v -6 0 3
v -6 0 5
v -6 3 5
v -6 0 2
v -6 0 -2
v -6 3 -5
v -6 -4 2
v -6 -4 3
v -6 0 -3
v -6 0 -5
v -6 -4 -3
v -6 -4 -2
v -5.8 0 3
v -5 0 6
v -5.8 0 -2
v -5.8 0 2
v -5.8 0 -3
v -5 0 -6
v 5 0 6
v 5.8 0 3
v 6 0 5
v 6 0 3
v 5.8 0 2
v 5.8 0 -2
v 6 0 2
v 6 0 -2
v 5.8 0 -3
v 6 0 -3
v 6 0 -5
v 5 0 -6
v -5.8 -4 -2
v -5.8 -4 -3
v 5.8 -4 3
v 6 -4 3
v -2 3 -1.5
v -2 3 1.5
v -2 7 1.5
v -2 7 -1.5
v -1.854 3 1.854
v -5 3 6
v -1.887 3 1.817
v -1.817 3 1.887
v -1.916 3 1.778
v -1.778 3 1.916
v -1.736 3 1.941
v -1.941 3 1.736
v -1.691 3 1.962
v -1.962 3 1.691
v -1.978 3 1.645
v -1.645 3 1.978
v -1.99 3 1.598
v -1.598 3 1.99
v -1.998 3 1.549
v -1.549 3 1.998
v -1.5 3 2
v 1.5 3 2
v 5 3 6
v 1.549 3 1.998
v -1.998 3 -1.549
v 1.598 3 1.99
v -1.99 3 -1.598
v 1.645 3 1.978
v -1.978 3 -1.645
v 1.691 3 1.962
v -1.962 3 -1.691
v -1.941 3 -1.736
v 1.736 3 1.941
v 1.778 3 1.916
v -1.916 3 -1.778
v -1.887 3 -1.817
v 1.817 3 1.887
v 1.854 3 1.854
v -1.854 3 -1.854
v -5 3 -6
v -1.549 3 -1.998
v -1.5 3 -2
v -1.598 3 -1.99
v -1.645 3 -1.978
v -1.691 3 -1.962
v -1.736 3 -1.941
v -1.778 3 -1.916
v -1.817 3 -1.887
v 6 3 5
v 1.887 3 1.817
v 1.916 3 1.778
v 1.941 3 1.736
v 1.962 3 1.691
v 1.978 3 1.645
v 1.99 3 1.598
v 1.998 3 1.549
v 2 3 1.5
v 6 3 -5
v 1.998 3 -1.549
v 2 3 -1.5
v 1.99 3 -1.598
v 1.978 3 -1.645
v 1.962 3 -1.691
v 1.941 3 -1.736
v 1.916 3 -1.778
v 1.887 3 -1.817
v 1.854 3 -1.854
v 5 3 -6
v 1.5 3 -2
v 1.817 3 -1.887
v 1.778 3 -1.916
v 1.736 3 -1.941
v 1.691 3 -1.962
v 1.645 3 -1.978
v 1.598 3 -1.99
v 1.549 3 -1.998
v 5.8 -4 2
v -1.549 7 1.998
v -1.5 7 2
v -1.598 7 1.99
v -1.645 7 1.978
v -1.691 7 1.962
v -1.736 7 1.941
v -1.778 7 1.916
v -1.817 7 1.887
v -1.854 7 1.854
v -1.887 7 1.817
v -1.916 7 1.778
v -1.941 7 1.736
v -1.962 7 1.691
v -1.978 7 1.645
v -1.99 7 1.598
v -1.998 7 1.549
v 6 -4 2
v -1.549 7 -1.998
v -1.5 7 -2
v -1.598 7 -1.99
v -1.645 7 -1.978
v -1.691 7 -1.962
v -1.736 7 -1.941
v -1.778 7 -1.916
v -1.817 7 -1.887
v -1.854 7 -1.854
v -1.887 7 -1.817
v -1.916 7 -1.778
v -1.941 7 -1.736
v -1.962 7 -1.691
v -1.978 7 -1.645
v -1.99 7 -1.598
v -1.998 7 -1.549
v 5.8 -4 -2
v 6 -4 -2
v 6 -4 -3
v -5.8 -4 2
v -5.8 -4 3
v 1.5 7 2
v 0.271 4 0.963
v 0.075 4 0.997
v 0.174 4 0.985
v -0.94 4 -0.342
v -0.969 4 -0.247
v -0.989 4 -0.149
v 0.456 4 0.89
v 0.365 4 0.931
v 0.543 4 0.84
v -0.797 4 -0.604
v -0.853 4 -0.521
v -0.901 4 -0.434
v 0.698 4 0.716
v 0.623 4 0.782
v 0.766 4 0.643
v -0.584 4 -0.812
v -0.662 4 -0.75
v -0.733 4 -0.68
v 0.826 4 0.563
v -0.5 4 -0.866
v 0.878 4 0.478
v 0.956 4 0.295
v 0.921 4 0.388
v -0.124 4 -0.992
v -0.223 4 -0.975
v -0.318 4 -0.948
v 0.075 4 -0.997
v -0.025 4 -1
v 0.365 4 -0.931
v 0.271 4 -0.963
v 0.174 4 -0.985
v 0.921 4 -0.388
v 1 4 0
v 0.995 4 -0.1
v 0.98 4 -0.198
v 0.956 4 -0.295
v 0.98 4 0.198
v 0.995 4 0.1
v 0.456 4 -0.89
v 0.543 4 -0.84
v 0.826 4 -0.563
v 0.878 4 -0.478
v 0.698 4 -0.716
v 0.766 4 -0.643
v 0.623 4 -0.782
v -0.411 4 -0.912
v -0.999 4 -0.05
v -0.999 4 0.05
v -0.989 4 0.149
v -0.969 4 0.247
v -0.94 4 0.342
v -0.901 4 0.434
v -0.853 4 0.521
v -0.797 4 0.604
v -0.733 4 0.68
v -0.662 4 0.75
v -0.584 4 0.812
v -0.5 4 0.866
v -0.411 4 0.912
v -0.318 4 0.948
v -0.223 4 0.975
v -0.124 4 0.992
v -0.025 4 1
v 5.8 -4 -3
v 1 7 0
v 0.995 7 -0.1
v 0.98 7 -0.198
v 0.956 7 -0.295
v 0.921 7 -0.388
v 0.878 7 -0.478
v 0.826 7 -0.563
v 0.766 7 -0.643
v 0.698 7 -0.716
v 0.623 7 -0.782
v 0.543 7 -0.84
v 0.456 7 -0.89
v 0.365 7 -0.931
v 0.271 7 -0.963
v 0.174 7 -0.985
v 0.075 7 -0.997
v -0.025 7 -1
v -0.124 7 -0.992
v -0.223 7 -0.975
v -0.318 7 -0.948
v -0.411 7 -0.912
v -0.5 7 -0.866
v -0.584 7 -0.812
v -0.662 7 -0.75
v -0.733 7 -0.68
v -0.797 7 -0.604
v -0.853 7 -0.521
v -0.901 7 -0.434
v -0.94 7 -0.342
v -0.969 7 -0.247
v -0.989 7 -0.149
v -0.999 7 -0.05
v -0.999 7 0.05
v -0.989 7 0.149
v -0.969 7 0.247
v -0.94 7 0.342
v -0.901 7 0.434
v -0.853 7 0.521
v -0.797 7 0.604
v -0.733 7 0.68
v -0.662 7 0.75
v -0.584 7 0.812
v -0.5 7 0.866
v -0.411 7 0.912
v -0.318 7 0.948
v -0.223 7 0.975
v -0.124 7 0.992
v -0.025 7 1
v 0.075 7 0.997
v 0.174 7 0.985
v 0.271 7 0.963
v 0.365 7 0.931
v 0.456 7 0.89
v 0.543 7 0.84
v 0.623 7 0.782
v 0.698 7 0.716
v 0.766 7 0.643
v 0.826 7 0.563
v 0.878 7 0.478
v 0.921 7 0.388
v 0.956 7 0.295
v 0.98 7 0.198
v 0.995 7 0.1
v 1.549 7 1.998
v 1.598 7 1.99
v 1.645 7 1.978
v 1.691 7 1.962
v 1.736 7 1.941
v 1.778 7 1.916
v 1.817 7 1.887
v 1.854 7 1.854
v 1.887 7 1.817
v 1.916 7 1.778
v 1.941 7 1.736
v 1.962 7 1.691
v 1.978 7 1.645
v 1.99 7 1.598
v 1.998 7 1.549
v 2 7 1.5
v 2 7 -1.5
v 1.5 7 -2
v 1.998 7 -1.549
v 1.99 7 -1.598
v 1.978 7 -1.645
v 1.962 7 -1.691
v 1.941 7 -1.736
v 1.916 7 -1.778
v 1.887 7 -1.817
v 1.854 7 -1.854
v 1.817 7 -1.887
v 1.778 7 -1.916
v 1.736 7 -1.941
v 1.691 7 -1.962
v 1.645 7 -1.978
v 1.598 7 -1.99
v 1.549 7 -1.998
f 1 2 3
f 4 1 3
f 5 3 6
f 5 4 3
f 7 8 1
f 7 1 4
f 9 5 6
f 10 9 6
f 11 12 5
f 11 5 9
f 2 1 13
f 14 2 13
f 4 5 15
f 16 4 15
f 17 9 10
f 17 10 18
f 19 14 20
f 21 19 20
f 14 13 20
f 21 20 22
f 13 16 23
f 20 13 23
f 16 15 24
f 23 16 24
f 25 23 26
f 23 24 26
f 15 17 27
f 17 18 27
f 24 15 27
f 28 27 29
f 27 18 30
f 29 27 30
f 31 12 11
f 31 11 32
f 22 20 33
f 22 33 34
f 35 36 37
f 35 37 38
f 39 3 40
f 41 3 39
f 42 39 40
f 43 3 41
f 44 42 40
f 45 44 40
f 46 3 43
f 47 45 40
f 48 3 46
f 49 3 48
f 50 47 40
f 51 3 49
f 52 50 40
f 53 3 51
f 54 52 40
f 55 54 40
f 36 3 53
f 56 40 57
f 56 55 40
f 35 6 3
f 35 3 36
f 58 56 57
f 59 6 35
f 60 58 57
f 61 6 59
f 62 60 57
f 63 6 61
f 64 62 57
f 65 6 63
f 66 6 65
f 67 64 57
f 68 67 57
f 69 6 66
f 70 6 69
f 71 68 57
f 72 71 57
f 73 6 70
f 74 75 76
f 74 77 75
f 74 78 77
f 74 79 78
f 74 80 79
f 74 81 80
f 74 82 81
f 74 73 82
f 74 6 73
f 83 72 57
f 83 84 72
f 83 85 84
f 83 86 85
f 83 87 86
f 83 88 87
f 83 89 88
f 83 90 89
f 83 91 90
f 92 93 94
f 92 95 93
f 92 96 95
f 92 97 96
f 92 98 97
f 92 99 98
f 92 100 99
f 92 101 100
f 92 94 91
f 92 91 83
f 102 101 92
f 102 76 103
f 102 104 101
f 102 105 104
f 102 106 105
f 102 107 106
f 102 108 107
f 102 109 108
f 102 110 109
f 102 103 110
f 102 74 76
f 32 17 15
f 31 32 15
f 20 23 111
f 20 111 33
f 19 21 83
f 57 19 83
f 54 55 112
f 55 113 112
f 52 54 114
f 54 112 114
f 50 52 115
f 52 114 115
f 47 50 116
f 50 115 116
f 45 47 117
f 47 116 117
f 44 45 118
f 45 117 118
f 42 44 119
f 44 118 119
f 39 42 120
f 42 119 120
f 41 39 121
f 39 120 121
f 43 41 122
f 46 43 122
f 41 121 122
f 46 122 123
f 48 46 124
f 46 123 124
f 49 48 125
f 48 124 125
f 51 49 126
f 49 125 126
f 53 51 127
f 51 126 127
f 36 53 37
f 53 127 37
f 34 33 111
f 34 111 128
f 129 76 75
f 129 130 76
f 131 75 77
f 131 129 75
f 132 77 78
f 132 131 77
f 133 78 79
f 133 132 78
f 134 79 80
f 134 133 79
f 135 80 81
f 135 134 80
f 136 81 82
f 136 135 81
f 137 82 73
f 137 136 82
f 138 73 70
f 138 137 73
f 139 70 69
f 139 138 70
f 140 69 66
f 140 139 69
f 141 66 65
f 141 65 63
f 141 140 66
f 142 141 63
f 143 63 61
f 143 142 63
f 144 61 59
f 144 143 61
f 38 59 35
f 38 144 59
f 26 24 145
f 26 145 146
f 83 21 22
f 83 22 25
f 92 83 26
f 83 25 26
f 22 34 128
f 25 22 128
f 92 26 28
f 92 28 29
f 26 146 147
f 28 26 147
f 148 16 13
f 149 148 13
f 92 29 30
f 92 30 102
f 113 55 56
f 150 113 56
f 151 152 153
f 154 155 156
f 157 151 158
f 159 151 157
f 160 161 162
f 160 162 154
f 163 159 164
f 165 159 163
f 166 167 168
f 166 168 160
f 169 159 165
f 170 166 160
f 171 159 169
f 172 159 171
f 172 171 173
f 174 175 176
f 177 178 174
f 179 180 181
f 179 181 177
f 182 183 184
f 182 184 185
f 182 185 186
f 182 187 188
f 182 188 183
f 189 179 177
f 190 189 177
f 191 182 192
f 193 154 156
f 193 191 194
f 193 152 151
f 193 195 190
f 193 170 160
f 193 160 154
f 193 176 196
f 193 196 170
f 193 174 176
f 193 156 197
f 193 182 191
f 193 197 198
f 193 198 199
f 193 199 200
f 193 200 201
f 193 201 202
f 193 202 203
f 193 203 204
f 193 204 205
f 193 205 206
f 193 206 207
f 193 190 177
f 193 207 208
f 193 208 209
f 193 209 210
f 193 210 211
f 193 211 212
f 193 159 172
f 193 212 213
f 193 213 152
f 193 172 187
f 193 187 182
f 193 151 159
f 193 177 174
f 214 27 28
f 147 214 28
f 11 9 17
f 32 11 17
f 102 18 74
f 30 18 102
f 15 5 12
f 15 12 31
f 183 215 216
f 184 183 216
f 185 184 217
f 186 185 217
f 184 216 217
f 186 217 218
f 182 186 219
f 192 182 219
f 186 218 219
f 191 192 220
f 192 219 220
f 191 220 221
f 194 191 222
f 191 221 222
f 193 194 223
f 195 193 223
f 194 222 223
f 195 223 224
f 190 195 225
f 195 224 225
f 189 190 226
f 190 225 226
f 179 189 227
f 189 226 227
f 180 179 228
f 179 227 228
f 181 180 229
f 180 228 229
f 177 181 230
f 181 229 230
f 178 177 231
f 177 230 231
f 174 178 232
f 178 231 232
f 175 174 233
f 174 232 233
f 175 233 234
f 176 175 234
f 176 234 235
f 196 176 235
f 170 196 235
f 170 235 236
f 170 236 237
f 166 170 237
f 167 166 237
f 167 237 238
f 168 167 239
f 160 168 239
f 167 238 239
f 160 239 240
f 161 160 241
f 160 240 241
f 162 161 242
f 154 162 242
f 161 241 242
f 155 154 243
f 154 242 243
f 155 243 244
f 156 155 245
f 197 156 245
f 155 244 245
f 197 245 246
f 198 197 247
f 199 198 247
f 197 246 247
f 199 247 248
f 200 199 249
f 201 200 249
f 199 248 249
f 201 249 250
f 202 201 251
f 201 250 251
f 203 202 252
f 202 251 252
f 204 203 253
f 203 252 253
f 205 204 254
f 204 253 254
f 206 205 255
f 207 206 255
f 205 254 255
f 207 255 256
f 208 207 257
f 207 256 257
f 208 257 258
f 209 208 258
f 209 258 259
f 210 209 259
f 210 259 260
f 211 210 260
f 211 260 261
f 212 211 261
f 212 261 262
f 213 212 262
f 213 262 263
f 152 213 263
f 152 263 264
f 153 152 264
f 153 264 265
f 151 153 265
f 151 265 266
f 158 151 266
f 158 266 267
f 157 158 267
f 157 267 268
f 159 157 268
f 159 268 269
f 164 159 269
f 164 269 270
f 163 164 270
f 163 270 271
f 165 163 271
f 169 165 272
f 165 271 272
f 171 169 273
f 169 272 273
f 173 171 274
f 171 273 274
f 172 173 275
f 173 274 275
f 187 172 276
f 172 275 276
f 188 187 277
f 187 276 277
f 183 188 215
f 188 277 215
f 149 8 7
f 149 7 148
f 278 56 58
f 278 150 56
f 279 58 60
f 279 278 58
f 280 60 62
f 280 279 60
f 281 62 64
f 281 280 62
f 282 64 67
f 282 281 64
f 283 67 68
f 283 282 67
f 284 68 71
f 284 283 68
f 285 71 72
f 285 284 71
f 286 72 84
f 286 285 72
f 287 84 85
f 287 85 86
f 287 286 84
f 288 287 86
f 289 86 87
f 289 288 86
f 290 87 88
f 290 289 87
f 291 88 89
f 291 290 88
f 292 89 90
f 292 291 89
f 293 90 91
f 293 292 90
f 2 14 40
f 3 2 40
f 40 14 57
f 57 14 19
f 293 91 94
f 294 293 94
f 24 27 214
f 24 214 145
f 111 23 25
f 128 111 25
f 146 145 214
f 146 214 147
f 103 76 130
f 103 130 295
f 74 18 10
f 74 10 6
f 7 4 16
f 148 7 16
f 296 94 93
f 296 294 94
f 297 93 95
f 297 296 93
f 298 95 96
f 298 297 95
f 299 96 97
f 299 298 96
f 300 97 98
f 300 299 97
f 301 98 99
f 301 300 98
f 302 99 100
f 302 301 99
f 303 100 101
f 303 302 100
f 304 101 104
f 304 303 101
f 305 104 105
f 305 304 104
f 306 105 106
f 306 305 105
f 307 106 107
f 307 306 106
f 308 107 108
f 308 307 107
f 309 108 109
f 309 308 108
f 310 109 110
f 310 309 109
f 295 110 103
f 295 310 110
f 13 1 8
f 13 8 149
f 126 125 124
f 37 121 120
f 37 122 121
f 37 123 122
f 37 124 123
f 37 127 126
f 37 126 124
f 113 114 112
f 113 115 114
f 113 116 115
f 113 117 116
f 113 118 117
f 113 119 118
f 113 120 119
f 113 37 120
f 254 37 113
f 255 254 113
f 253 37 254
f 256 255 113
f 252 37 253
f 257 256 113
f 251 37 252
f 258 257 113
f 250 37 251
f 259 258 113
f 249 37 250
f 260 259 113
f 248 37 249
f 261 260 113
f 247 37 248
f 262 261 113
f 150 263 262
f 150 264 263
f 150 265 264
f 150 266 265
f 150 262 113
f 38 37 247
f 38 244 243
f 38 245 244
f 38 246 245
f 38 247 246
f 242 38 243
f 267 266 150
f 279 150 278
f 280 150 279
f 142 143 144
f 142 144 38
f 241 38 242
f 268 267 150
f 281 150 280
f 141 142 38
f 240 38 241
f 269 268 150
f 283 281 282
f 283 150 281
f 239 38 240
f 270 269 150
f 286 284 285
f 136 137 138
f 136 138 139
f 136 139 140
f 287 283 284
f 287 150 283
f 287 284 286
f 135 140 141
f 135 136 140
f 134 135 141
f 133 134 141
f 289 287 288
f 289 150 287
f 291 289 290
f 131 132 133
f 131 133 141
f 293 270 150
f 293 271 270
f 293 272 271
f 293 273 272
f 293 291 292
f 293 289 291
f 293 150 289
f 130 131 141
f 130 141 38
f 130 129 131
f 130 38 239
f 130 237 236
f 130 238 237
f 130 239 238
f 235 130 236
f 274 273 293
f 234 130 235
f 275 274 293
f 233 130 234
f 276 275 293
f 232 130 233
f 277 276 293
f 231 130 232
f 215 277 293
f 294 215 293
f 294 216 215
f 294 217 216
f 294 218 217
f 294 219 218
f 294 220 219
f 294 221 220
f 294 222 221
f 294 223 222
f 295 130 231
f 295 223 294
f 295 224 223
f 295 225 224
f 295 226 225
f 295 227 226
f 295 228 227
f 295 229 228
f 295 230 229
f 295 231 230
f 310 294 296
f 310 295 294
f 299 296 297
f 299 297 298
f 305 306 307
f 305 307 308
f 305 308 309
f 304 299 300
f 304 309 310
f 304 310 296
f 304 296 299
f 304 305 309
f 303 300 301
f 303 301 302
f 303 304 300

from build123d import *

# Parameters (mm, degrees)
SKETCH1_W           = 12
SKETCH1_H           = 12
BOSS_EXTRUDE1_DEPTH = 3
SKETCH2_W           = 4
SKETCH2_H           = 4
BOSS_EXTRUDE2_DEPTH = 4
SKETCH3_R           = 1
CUT_EXTRUDE1_DEPTH  = 3
FILLET2_R           = 0.5
SKETCH4_W           = 0.2
SKETCH4_H           = 1
BOSS_EXTRUDE3_DEPTH = 4
CHAMFER1_SIZE       = 1


with BuildPart() as part:
    # Sketch1 → Boss-Extrude1 (new body)
    with BuildSketch(Plane(origin=(0, 0, 0), x_dir=(1, 0, 0), z_dir=(0, 1, 0))):
        Rectangle(SKETCH1_W, SKETCH1_H)
    extrude(amount=BOSS_EXTRUDE1_DEPTH)

    # Sketch2 → Boss-Extrude2 (add)
    with BuildSketch(Plane(origin=(0, 3, 0), x_dir=(1, 0, 0), z_dir=(0, 1, 0))):
        Rectangle(SKETCH2_W, SKETCH2_H)
    extrude(amount=BOSS_EXTRUDE2_DEPTH)

    # Sketch3 → Cut-Extrude1 (cut)
    with BuildSketch(Plane(origin=(0, 7, 0), x_dir=(1, 0, 0), z_dir=(0, 1, 0))):
        Circle(SKETCH3_R)
    extrude(amount=-CUT_EXTRUDE1_DEPTH, mode=Mode.SUBTRACT)

    # Fillet2
    fillet2_edges = [part.edges().sort_by_distance(p)[0] for p in [
        (2, 5, 2),
        (2, 5, -2),
        (-2, 5, -2),
        (-2, 5, 2),
    ]]
    fillet(fillet2_edges, radius=FILLET2_R)

    # Sketch4 → Boss-Extrude3 (add)
    with BuildSketch(Plane.XZ):
        with Locations((-5.9, -2.5)):
            Rectangle(SKETCH4_W, SKETCH4_H)
        with Locations((-5.9, 2.5)):
            Rectangle(SKETCH4_W, SKETCH4_H)
        with Locations((5.9, 2.5)):
            Rectangle(SKETCH4_W, SKETCH4_H)
        with Locations((5.9, -2.5)):
            Rectangle(SKETCH4_W, SKETCH4_H)
    extrude(amount=BOSS_EXTRUDE3_DEPTH)

    # Chamfer1
    chamfer1_edges = [part.edges().sort_by_distance(p)[0] for p in [
        (6, 1.5, 6),
        (-6, 1.5, 6),
        (-6, 1.5, -6),
        (6, 1.5, -6),
    ]]
    chamfer(chamfer1_edges, length=CHAMFER1_SIZE)


solid = part.part
